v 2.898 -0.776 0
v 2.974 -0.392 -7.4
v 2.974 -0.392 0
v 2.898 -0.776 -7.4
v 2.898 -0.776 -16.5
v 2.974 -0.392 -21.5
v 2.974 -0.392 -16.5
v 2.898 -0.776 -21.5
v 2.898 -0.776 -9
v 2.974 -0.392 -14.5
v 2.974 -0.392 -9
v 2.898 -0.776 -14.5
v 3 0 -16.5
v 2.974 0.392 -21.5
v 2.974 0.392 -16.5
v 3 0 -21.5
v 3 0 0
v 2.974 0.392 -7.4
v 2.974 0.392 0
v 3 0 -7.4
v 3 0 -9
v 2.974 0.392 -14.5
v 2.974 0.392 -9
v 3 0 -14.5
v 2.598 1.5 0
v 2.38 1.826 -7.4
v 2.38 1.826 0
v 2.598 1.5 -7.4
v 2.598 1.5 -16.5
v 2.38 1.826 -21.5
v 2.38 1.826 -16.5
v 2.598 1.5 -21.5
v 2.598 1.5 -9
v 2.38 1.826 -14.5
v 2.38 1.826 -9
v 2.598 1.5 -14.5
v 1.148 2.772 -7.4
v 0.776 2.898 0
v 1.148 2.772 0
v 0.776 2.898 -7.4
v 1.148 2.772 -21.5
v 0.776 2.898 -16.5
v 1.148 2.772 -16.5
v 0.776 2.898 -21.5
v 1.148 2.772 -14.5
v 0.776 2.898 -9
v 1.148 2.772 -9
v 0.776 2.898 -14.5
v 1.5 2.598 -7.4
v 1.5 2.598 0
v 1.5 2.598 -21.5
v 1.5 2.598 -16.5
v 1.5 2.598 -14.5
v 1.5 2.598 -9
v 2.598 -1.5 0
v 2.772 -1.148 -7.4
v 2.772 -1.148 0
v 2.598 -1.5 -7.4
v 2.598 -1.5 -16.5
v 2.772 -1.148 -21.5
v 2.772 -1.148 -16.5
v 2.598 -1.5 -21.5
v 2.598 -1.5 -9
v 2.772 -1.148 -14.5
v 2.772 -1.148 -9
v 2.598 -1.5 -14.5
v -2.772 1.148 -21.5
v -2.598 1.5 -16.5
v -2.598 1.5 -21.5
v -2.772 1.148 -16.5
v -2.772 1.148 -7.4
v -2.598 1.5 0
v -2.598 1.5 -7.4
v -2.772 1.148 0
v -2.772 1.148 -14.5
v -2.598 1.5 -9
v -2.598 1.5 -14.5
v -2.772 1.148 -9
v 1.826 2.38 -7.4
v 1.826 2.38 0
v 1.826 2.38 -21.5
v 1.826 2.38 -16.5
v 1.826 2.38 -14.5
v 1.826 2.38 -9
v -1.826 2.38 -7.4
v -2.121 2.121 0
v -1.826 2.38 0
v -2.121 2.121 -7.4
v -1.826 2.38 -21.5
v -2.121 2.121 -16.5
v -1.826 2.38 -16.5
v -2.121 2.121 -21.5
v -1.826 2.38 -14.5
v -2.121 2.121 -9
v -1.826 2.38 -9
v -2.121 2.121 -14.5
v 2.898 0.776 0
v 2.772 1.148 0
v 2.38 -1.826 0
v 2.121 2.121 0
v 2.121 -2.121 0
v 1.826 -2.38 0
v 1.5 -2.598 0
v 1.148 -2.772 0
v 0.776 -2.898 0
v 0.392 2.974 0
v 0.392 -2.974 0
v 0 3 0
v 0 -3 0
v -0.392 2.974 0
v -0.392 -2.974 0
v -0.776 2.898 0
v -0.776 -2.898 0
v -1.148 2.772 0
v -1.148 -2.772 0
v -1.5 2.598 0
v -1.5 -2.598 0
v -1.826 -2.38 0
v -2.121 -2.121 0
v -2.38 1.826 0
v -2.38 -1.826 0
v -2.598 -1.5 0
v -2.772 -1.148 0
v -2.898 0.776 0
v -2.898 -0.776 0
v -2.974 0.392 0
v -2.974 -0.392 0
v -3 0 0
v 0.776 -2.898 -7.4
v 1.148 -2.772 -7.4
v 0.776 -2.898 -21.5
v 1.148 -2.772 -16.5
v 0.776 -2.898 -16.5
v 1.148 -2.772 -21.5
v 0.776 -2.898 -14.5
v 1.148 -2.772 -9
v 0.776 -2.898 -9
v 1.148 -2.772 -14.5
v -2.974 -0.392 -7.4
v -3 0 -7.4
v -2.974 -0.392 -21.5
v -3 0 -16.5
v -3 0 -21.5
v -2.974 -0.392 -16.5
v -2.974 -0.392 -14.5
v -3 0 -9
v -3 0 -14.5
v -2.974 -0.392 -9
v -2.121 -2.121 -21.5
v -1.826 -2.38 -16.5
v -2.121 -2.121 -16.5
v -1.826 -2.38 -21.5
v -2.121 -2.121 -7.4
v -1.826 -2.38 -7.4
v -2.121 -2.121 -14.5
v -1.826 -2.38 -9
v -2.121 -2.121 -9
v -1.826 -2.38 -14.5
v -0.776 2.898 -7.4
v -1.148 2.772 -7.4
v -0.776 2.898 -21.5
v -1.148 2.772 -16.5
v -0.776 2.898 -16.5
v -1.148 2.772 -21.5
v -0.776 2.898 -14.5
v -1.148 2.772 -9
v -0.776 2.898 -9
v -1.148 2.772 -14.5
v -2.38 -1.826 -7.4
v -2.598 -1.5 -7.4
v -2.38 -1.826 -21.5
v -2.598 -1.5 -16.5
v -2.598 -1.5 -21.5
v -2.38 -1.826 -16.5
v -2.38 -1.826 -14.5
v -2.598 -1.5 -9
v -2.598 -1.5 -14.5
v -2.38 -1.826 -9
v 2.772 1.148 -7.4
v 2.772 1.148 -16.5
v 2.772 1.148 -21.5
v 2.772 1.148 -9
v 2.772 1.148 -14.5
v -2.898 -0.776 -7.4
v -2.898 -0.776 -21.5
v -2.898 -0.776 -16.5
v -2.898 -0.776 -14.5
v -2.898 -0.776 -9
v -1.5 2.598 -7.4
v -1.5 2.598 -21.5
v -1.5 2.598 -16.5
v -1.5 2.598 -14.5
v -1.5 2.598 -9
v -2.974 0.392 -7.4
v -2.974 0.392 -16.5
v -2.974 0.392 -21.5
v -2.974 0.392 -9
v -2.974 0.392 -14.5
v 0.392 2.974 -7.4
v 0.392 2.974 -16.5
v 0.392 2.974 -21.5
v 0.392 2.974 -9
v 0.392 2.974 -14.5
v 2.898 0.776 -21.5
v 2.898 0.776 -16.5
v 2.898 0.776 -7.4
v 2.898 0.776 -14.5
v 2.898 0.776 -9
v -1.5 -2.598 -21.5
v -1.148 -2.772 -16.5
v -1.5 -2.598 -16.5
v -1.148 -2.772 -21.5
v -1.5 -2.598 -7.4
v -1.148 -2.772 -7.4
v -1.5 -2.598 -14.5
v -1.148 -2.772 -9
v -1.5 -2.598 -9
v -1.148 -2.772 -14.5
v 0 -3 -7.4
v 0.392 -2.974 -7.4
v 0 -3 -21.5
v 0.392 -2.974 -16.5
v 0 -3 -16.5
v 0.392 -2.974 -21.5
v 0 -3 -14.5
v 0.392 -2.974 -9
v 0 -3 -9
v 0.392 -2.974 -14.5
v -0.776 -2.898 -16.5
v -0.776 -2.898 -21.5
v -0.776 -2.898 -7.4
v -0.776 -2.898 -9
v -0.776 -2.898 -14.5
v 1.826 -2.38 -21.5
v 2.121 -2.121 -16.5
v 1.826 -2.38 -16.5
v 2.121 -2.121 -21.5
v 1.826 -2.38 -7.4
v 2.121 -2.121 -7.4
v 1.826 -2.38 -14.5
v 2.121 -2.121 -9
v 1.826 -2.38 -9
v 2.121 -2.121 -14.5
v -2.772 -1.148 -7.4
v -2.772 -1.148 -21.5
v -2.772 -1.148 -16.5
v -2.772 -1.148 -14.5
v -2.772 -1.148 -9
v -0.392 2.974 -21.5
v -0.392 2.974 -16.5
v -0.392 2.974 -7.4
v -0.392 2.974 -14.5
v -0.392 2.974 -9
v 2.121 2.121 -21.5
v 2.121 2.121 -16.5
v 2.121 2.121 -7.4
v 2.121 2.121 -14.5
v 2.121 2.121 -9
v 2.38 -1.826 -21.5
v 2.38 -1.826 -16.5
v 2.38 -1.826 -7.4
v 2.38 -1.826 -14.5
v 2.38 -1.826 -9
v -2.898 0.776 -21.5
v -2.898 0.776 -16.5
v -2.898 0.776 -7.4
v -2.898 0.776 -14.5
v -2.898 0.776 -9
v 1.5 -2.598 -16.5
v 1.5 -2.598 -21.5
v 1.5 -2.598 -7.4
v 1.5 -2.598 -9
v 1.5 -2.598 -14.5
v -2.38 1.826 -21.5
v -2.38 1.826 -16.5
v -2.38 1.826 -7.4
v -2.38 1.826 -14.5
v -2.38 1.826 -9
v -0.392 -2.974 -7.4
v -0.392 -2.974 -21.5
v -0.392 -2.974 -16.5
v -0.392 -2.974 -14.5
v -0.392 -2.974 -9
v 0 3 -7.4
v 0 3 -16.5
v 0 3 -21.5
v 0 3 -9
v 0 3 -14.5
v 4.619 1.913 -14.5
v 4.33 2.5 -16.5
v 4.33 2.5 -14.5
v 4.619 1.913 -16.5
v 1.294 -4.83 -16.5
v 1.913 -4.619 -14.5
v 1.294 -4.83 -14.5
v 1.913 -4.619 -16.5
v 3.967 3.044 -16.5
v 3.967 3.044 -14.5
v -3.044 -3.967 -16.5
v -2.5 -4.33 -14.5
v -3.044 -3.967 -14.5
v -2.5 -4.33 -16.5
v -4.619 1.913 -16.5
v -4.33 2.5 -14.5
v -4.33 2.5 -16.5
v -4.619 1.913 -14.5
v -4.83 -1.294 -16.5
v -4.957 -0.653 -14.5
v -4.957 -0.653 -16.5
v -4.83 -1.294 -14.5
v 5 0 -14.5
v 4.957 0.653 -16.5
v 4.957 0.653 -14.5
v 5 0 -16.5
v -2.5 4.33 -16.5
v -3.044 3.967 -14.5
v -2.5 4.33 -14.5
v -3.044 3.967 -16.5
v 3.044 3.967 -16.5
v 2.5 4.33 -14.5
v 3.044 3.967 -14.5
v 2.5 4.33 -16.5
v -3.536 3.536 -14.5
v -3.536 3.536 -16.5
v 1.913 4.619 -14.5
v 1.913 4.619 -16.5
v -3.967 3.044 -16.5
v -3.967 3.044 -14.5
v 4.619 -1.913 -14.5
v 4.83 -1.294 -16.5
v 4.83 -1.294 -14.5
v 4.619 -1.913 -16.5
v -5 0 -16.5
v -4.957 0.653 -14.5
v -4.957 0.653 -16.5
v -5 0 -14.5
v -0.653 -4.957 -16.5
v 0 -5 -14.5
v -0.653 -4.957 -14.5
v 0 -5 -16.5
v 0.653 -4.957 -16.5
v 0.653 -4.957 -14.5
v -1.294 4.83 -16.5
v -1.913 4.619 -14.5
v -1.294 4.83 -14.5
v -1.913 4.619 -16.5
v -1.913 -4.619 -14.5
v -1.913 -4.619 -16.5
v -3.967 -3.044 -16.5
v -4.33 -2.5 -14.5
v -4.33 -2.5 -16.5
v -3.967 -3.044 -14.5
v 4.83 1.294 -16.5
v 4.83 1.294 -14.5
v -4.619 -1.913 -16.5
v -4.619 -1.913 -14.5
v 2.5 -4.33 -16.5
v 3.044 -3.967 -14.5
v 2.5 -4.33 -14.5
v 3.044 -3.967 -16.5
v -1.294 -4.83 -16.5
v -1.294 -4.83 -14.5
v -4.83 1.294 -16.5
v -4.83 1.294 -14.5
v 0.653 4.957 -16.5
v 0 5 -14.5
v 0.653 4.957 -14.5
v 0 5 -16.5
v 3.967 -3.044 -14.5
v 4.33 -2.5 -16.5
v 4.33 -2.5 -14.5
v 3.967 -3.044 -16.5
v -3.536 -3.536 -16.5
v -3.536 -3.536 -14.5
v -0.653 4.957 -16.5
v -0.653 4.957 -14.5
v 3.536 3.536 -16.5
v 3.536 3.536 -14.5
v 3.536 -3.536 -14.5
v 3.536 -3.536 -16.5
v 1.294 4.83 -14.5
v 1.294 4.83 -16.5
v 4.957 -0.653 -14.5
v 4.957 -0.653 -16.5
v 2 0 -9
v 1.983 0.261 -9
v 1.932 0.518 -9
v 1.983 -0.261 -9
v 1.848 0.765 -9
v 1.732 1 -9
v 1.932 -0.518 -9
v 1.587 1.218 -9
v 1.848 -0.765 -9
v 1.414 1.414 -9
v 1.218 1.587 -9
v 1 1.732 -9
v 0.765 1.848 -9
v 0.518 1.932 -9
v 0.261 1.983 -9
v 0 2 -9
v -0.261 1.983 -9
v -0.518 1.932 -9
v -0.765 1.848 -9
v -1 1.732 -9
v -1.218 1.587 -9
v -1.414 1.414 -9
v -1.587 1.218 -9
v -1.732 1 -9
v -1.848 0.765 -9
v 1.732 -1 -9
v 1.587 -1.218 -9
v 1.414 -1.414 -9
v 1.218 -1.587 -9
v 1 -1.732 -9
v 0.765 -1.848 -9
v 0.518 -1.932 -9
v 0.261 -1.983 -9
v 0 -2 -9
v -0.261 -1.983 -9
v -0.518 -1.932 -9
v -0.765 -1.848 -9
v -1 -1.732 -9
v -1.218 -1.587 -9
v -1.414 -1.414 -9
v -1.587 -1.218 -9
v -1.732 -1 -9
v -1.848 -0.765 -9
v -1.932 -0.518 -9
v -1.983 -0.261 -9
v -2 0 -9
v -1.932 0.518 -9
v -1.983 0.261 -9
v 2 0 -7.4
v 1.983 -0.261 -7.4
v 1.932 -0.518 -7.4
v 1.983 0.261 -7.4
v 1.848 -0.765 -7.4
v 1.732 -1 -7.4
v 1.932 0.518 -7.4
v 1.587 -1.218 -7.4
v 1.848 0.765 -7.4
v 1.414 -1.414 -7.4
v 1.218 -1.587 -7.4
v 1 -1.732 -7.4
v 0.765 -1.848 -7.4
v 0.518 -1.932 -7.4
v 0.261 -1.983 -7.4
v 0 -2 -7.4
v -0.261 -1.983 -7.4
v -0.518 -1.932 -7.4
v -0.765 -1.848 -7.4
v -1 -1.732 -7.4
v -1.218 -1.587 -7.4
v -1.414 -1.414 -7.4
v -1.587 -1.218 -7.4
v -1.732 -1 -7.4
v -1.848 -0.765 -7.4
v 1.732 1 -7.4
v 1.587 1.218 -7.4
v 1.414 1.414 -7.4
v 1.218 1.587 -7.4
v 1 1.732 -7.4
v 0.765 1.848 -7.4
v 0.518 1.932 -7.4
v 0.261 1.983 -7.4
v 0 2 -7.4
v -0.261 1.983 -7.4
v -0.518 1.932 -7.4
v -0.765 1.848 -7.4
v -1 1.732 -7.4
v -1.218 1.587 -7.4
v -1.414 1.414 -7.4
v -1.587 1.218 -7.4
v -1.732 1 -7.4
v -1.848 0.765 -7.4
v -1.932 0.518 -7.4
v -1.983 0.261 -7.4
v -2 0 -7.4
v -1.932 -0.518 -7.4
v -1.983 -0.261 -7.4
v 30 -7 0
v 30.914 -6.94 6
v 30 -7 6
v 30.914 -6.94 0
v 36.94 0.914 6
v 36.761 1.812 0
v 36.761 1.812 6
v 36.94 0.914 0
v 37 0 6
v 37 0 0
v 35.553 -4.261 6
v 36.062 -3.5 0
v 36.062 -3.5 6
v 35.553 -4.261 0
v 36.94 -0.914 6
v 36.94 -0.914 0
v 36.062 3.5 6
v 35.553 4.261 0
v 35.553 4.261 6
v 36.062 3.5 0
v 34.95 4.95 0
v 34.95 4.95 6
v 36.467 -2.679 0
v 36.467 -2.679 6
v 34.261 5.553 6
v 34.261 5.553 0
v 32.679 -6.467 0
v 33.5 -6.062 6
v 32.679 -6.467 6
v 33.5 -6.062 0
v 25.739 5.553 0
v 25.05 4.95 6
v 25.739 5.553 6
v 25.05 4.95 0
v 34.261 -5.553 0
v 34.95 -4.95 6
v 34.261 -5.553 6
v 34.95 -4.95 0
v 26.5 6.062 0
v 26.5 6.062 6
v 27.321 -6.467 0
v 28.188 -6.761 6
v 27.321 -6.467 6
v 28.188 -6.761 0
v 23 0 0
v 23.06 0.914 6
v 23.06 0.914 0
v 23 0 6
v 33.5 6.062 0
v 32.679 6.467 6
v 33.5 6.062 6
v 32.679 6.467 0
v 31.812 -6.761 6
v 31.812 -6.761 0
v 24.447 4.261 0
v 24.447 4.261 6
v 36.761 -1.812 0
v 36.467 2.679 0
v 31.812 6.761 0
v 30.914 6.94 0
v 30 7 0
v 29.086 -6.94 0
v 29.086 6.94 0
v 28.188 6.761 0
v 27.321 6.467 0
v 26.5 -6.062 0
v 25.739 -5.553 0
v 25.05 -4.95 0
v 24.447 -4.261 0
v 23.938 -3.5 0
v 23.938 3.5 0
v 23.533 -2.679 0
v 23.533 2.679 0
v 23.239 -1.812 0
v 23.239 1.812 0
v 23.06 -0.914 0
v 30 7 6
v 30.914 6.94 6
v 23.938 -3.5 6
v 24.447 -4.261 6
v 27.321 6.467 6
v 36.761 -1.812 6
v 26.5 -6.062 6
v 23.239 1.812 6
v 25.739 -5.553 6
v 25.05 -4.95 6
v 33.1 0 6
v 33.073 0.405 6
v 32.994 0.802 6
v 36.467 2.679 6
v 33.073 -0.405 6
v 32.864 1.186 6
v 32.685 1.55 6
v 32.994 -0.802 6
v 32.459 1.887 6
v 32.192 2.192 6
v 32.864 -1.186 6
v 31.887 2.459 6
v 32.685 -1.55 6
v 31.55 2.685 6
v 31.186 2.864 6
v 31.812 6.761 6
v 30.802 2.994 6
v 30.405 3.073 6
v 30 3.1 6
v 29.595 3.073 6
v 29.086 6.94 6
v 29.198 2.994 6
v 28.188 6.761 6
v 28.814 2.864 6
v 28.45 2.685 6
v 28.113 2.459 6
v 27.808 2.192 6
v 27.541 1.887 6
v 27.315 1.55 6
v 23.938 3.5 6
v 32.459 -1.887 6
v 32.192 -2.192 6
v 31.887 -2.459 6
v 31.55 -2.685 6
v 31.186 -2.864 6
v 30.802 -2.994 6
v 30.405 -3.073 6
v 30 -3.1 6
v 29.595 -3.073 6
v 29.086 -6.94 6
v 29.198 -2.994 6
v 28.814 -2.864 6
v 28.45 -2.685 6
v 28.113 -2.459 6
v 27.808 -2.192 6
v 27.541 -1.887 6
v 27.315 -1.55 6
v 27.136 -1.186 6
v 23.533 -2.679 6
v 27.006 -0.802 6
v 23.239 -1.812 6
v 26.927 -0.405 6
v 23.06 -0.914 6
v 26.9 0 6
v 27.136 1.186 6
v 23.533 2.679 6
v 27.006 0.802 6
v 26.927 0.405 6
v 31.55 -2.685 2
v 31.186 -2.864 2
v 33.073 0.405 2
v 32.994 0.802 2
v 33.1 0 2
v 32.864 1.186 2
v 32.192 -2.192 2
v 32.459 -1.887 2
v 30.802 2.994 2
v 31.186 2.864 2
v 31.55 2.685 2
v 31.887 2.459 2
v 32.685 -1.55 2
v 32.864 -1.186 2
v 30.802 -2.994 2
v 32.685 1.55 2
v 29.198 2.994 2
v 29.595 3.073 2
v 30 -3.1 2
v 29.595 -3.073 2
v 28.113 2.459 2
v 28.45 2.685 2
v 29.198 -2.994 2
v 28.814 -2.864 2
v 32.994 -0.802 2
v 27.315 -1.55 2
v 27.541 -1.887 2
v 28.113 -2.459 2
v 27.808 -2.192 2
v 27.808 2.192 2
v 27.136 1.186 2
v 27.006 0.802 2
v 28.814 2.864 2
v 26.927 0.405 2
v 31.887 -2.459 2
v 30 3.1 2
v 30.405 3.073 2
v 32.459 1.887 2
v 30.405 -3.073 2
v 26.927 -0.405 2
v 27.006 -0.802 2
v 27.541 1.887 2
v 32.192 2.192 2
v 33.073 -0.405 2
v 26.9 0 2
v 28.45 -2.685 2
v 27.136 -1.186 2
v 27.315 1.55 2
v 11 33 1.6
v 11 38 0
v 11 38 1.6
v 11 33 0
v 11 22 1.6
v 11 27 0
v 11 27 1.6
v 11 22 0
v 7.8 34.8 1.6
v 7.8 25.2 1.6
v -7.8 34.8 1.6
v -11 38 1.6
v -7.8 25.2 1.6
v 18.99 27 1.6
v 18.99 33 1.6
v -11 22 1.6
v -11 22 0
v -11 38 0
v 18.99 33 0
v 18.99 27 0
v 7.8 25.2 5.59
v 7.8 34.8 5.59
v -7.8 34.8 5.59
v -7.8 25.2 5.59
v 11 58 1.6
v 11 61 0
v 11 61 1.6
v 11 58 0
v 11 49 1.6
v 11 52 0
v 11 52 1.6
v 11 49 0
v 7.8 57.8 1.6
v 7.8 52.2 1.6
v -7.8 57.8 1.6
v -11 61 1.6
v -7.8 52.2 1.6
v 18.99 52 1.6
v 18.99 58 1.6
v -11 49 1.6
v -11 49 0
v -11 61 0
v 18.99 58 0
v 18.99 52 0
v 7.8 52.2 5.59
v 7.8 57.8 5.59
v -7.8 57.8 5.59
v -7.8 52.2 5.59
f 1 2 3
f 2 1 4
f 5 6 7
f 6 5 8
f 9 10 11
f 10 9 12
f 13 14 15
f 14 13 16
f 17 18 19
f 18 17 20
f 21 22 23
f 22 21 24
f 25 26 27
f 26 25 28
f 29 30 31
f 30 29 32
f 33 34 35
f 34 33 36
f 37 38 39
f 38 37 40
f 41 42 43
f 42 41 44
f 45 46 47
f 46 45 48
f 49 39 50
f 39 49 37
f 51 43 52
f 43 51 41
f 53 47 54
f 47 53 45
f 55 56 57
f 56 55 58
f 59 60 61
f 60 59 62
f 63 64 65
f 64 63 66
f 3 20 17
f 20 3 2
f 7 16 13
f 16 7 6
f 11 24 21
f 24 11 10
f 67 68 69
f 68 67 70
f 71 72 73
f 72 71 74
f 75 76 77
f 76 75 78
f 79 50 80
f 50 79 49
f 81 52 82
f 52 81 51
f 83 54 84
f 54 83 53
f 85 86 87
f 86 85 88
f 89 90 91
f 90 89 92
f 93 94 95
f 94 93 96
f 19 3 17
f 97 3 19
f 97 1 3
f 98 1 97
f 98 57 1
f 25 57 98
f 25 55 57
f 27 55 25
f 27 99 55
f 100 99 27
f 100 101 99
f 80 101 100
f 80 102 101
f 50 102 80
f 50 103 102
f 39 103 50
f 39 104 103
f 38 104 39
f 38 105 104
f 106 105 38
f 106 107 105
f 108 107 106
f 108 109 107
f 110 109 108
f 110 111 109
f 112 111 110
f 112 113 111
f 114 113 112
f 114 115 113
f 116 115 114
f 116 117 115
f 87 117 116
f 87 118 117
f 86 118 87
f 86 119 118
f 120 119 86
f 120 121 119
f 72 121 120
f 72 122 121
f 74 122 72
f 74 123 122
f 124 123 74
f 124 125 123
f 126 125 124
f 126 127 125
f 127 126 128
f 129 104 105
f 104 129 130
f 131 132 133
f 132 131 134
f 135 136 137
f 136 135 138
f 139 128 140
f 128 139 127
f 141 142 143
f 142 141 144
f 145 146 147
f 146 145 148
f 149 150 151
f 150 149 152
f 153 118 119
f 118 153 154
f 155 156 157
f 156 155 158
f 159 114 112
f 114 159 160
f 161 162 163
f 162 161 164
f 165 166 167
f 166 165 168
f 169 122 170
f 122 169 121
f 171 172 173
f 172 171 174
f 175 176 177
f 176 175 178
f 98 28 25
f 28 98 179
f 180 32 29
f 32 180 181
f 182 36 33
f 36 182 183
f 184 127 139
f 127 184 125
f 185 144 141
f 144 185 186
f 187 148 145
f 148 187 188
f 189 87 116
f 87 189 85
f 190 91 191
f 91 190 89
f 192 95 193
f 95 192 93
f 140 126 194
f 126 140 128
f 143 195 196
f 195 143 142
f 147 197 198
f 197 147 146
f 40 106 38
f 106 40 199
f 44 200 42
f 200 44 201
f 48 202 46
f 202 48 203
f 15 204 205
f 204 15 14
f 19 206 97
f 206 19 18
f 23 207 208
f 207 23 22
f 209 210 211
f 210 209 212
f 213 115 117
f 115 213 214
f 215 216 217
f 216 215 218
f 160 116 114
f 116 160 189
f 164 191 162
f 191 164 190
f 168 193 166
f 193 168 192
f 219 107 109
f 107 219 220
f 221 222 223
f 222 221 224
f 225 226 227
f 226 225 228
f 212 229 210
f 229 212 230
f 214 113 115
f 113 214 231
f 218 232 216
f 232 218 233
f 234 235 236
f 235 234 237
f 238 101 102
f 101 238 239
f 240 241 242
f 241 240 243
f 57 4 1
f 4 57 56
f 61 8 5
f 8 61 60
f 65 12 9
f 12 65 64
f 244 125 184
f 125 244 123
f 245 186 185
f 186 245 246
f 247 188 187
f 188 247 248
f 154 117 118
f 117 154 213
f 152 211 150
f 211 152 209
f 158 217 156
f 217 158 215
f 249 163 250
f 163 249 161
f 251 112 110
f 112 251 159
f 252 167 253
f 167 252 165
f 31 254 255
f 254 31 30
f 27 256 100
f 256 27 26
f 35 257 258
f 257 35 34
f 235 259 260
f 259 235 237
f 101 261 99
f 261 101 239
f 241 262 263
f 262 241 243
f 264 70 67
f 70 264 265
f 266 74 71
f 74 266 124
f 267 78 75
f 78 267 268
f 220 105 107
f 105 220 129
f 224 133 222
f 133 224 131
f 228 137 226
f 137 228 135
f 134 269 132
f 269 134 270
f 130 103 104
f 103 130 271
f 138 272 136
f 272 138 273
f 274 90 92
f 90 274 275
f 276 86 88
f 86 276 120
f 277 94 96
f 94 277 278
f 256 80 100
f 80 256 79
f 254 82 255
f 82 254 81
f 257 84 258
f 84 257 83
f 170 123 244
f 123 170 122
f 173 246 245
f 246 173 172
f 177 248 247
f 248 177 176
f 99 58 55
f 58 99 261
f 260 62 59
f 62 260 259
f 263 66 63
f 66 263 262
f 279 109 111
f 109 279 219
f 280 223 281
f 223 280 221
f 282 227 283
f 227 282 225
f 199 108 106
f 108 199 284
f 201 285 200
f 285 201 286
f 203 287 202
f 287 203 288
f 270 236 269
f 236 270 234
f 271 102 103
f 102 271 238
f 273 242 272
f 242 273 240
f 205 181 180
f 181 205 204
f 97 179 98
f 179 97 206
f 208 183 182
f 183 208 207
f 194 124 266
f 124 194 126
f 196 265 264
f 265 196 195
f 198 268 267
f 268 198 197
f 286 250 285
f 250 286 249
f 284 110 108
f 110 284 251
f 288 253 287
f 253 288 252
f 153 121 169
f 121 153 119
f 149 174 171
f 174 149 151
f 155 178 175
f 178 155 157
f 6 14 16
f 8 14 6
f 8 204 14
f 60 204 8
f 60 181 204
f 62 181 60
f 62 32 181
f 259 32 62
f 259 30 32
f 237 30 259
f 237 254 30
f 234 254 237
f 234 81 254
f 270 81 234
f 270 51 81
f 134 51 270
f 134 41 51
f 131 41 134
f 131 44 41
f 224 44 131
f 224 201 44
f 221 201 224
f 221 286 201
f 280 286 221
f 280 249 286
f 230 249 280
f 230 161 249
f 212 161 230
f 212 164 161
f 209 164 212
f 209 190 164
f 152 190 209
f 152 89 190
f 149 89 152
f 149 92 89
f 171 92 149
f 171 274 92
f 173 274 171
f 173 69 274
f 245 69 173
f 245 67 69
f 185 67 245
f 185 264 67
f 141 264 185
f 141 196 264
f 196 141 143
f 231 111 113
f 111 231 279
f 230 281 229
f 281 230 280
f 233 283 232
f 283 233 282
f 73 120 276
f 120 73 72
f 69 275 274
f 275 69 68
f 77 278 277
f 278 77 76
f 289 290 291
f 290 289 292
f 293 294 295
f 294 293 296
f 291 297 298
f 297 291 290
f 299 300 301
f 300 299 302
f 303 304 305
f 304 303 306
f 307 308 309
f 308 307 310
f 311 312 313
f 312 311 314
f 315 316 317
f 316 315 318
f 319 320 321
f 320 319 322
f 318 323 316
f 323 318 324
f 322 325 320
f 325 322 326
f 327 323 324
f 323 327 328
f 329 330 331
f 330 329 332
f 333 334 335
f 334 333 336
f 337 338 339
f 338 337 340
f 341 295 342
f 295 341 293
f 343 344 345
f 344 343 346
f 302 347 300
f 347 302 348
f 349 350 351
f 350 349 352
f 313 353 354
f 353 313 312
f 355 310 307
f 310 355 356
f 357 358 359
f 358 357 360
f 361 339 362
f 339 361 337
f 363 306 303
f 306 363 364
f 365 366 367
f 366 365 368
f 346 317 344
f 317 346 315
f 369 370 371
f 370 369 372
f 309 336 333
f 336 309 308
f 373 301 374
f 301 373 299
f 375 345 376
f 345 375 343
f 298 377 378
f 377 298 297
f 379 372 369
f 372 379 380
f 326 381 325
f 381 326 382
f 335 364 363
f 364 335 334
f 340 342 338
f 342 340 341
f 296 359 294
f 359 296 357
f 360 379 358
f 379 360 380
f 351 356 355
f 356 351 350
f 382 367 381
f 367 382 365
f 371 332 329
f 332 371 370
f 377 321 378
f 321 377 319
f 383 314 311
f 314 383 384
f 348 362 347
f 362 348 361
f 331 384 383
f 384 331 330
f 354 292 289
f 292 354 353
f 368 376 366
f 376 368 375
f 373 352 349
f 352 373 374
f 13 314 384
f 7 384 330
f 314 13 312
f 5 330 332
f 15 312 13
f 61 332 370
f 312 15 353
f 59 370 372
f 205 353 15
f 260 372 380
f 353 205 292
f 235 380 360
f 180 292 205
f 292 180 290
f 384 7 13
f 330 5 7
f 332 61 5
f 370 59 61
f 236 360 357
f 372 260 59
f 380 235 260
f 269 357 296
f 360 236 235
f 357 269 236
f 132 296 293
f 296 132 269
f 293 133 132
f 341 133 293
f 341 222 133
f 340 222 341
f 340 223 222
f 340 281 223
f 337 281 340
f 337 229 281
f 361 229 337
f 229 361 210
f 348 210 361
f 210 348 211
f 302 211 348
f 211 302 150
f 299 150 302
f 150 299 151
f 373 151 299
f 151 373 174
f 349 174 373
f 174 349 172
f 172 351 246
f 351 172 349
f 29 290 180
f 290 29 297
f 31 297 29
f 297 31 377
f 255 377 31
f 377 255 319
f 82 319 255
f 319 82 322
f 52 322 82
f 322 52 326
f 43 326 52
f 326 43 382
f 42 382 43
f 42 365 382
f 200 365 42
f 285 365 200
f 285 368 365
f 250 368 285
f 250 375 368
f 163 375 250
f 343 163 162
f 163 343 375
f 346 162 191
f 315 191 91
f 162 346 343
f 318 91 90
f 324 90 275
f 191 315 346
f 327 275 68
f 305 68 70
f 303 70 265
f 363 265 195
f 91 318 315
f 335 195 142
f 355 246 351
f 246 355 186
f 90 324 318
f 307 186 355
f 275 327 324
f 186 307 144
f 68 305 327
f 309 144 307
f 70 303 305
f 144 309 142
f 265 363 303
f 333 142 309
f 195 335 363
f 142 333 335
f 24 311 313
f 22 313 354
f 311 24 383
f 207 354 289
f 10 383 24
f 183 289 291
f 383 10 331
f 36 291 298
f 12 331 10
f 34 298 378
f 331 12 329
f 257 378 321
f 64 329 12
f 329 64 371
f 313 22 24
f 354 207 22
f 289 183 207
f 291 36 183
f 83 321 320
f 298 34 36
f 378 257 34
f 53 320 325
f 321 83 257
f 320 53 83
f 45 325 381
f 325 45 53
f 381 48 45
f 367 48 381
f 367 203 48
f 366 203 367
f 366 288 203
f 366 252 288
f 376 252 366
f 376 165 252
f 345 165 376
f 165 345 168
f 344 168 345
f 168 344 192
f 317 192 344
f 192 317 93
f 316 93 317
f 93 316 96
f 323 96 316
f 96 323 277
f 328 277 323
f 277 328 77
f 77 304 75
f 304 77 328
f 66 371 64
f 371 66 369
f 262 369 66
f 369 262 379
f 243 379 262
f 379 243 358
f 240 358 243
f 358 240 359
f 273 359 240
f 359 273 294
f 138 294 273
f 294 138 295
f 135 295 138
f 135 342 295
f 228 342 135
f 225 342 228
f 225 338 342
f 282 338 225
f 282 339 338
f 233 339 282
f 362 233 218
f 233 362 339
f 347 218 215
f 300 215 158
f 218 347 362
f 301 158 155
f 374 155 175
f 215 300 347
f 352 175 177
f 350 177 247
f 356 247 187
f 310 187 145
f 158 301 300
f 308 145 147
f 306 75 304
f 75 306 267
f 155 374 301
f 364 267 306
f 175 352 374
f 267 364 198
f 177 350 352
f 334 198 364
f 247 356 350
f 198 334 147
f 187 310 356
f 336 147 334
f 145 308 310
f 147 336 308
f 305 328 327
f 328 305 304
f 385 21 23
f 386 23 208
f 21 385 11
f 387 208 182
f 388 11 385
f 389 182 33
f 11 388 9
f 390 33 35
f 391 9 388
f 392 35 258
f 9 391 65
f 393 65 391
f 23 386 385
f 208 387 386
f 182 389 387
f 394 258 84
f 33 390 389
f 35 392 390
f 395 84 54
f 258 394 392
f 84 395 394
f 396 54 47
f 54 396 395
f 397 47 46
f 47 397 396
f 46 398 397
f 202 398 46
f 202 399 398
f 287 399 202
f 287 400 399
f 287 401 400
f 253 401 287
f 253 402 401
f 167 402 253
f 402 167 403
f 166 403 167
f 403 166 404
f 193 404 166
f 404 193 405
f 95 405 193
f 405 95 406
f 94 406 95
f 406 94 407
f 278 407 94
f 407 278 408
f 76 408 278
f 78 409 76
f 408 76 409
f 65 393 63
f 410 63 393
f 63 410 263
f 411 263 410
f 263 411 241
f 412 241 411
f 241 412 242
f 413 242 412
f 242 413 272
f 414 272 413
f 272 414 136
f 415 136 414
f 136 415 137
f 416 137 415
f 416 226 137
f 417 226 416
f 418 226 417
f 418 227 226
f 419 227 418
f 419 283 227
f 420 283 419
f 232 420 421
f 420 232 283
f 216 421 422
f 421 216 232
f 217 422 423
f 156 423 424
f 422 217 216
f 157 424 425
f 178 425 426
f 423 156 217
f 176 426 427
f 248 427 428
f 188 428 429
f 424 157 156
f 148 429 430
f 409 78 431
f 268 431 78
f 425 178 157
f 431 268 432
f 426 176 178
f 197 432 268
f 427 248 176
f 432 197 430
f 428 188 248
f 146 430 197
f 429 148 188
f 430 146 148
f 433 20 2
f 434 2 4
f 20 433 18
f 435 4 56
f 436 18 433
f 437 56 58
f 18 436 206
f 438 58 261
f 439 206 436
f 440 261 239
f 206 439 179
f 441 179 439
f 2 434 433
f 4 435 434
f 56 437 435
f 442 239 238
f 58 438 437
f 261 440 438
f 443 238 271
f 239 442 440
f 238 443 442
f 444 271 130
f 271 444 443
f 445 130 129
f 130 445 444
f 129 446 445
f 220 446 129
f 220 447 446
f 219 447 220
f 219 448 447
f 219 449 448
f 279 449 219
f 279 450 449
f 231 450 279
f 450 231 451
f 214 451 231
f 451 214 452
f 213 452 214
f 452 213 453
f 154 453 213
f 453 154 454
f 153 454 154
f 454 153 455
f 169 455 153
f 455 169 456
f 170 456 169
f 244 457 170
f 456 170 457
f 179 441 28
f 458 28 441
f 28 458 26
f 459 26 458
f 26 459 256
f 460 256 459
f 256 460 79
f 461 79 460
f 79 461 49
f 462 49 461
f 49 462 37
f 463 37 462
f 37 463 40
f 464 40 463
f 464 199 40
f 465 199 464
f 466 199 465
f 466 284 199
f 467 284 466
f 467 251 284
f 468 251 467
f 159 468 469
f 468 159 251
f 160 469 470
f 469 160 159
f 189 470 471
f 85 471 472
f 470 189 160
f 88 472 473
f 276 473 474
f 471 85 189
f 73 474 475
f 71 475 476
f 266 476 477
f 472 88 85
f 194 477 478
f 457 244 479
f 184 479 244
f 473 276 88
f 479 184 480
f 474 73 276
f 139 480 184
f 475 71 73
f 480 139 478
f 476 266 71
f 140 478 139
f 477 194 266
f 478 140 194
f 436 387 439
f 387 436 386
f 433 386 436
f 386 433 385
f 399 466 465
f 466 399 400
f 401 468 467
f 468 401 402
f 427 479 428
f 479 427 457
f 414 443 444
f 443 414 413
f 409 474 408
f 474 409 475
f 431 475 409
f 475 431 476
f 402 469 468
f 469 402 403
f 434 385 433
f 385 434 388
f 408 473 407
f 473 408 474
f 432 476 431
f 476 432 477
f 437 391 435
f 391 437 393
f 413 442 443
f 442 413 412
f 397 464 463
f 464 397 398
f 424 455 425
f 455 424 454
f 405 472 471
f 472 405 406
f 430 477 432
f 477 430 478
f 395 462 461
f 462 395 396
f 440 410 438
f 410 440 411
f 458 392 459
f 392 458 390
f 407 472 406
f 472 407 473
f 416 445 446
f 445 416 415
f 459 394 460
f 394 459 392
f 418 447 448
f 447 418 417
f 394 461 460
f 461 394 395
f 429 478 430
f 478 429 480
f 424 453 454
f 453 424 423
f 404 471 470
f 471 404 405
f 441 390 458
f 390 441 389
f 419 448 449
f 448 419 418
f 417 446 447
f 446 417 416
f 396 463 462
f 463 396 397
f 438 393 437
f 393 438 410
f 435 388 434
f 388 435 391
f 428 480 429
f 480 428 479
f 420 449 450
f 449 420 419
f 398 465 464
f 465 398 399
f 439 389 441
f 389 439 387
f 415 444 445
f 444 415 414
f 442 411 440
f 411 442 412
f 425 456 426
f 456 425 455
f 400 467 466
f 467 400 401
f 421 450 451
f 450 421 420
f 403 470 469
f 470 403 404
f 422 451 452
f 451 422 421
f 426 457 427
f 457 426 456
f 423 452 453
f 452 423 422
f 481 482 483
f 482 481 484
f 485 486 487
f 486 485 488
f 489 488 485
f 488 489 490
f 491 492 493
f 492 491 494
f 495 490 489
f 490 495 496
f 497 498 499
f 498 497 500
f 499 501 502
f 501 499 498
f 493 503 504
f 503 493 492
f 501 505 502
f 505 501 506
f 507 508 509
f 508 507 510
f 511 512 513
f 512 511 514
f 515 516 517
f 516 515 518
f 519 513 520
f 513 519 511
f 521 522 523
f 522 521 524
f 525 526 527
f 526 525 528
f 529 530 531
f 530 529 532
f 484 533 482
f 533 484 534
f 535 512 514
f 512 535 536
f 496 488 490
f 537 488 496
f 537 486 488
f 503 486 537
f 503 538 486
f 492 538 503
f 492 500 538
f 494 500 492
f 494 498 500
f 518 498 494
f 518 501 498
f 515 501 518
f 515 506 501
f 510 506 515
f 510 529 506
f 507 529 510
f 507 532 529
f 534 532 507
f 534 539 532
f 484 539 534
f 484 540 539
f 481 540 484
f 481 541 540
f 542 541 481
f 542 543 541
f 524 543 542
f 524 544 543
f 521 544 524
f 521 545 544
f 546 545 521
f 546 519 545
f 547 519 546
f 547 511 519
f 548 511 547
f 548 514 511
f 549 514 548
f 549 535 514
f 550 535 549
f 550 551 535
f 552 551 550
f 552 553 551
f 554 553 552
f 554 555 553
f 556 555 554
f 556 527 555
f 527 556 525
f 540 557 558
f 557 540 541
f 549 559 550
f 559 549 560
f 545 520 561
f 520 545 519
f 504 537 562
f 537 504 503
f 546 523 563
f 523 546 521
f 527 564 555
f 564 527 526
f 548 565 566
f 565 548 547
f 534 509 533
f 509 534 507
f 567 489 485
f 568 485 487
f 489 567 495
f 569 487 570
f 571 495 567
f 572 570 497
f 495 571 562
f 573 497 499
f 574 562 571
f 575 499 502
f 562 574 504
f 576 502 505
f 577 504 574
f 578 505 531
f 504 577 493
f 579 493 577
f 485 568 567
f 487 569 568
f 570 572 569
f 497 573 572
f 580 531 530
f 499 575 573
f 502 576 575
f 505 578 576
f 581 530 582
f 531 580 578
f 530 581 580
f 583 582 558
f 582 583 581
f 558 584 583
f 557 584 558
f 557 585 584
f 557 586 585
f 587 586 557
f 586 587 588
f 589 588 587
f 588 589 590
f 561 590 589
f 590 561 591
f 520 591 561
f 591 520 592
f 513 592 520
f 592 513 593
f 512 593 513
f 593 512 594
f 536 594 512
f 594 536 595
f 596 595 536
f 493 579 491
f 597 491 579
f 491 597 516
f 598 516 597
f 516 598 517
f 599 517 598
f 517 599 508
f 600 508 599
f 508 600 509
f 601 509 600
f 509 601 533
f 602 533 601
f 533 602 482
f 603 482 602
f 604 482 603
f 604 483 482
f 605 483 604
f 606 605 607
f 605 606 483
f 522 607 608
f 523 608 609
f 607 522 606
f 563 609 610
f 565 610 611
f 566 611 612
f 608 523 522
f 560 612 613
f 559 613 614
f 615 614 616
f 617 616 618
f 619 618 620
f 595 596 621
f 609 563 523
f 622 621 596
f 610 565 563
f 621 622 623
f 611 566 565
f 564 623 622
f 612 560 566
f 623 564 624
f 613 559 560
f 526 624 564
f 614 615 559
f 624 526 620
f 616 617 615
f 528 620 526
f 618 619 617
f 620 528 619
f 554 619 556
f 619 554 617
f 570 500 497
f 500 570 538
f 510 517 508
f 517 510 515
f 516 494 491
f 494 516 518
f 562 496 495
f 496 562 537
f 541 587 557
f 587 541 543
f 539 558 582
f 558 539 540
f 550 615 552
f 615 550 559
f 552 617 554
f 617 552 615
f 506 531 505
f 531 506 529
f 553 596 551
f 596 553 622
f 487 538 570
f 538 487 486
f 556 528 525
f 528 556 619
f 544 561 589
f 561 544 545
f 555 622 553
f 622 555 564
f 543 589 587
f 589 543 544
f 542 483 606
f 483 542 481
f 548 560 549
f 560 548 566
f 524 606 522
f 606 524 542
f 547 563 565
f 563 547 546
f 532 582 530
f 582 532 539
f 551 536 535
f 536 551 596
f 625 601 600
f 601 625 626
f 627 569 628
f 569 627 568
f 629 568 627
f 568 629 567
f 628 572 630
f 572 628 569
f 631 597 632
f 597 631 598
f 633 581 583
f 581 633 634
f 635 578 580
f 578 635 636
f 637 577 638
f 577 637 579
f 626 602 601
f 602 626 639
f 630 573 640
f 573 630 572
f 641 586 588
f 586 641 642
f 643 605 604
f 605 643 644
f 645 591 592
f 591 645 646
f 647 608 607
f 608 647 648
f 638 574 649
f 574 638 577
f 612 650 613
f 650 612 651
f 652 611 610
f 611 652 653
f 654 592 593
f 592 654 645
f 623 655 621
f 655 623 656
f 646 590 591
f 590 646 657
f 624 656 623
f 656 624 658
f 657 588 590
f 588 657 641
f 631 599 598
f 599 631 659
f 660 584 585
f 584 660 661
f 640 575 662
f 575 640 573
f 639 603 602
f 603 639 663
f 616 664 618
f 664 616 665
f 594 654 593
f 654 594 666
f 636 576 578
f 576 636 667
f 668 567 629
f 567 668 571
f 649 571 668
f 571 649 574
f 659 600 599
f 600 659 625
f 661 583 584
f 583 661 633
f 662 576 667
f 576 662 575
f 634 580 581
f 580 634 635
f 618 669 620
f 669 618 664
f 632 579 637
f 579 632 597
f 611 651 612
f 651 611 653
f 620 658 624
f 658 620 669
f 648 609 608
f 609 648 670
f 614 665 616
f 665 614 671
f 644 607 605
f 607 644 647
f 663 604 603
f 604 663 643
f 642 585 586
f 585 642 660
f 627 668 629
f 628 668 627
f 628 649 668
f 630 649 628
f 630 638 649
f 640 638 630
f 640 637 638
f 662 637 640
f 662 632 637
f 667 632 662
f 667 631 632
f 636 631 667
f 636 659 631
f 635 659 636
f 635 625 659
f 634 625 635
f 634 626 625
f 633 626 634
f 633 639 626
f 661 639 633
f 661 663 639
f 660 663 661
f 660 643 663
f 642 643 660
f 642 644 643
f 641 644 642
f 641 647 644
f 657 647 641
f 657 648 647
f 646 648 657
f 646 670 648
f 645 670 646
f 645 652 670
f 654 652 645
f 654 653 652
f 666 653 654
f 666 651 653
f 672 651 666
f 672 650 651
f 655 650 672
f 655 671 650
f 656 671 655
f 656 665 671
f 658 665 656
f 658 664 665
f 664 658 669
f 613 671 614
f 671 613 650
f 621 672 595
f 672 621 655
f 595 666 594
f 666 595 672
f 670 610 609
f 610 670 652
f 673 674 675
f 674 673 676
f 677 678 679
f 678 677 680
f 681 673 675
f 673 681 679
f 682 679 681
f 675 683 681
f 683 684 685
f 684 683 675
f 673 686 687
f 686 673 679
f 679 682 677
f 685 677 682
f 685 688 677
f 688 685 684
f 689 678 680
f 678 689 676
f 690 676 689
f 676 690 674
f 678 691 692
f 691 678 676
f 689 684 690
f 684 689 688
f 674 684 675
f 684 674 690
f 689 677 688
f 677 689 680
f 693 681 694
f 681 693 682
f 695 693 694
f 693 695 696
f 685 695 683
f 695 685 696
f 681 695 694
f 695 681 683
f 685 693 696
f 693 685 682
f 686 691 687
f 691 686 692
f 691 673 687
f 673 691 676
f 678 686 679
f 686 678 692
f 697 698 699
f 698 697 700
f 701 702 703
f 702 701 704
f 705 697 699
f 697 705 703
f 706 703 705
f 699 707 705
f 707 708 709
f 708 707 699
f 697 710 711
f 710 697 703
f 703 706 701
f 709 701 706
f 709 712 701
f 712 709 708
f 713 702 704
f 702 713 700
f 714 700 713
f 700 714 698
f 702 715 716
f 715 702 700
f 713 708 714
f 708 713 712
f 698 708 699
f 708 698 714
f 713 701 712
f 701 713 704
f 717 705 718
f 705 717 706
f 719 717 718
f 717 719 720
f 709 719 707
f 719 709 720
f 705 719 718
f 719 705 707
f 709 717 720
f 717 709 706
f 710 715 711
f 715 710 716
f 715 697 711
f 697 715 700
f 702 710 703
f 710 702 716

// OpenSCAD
// Plunger, plunger cap and two plugs (charge port and microSD). Print the plugs in TPU.
include <bino.scad>
translate([0, 0, 0]) rotate([0, -90, 0]) translate([-58.5, 0, 0]) plunger();
translate([30, 0, 0]) plunger_cap();
translate([0, 30, 0]) plug(charge_w, charge_h);
translate([0, 55, 0]) plug(sd_w, sd_h);
